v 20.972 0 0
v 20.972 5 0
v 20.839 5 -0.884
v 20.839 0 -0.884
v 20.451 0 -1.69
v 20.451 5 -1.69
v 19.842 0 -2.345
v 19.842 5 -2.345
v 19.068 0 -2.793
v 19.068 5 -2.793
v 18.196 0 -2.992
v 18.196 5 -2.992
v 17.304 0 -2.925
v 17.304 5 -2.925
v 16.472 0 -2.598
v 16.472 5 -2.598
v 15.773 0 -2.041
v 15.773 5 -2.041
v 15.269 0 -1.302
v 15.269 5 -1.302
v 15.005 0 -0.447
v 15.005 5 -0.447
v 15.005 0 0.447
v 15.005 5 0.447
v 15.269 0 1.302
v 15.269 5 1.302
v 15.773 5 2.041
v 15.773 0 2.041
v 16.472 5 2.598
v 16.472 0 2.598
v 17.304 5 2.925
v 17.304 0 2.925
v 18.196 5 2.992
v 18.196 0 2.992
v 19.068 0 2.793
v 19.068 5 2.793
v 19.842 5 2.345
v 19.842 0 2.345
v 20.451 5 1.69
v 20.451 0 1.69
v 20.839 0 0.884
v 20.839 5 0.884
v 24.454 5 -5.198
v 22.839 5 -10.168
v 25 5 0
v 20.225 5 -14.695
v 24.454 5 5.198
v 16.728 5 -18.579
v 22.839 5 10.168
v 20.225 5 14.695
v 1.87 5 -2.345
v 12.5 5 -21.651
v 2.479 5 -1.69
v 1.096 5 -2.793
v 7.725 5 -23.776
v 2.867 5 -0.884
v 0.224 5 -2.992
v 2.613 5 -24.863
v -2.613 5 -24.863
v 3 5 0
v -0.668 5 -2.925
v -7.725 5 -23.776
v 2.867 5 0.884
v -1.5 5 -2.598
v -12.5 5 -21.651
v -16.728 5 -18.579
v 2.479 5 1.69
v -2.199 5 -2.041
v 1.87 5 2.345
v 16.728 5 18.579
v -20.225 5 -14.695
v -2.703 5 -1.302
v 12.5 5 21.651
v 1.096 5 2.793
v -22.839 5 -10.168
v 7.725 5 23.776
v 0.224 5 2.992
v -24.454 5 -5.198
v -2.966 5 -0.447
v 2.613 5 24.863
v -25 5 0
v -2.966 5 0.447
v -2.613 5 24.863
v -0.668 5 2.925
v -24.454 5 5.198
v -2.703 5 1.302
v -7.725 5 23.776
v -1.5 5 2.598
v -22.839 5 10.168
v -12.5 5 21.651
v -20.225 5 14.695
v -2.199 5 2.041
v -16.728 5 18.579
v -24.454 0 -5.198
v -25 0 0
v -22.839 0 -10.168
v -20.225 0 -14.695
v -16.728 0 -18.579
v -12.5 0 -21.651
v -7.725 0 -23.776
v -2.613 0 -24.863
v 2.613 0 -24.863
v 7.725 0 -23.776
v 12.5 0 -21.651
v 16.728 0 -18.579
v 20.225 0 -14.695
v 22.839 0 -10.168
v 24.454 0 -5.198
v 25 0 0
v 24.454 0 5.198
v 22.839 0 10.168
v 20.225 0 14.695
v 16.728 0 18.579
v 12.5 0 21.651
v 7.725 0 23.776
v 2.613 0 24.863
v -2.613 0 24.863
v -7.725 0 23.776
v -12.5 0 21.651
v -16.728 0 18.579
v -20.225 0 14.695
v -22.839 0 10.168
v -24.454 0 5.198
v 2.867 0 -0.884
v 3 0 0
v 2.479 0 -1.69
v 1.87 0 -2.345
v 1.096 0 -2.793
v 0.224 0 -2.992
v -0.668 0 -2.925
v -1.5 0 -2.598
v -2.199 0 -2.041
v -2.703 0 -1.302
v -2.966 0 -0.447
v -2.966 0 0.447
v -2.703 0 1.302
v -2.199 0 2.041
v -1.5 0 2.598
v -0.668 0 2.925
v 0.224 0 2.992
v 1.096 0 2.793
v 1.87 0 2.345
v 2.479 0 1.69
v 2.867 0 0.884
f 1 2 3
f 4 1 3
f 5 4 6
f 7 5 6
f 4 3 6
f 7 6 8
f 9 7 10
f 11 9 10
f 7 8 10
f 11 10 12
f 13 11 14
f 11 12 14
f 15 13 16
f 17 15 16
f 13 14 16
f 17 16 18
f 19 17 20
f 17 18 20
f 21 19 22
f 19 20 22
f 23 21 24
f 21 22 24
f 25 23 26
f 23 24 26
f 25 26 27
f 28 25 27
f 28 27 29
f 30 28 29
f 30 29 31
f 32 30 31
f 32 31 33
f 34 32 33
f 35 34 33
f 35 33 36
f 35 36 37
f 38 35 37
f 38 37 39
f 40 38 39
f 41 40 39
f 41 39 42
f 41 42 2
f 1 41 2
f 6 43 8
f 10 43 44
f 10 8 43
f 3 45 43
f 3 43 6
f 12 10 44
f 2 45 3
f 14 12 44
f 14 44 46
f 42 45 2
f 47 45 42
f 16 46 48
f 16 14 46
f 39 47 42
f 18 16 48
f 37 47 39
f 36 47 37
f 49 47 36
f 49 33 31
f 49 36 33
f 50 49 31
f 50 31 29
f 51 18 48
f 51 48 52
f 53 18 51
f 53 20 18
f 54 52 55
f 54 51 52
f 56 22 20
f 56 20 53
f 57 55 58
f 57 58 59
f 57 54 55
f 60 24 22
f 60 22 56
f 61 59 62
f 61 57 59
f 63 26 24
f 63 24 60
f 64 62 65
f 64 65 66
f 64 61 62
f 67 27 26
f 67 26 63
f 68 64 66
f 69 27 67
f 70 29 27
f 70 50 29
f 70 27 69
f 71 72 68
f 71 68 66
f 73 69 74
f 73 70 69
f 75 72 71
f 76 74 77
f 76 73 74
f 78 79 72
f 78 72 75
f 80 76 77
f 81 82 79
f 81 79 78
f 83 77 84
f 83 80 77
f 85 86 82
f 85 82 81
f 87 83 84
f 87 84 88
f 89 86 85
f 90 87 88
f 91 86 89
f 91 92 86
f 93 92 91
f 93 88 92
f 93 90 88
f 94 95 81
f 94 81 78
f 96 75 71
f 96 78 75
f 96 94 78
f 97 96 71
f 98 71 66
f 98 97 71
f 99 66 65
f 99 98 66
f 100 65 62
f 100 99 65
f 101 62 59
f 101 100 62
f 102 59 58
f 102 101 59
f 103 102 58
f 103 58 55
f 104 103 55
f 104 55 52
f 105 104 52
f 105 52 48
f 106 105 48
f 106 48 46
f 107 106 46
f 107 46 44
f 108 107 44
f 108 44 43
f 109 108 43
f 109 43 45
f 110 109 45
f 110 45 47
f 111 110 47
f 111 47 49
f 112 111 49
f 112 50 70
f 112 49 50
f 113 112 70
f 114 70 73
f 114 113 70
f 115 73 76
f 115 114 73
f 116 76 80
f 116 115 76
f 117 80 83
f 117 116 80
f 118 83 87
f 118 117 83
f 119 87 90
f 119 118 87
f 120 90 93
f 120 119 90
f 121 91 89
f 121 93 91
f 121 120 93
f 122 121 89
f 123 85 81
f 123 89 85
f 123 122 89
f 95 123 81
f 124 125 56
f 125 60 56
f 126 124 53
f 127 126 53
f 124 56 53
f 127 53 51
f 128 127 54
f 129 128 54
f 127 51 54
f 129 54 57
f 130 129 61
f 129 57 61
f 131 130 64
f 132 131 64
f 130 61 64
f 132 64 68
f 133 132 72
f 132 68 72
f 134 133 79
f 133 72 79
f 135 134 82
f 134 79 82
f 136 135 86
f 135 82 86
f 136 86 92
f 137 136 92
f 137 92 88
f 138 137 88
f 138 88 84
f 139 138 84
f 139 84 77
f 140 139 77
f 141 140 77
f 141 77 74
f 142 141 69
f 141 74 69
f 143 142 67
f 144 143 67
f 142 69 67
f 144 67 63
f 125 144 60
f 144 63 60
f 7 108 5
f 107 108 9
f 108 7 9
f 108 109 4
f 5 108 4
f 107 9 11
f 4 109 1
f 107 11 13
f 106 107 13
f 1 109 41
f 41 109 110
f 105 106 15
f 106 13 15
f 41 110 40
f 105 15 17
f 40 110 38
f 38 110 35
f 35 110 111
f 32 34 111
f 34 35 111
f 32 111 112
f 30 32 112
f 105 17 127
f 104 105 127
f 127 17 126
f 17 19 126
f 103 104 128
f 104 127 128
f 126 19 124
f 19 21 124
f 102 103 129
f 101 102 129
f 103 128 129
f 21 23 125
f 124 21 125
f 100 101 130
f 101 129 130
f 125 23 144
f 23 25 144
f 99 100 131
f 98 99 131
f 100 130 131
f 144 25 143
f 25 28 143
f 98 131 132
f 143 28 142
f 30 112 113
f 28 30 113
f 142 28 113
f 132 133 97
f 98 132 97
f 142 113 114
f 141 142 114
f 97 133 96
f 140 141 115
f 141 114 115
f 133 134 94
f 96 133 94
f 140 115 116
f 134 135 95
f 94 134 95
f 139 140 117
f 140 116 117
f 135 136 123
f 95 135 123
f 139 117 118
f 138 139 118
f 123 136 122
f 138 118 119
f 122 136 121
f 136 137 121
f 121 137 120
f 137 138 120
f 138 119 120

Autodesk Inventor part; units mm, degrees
ref_plane "YZ Plane" through (0, 0, 0) normal (1, 0, 0) x (0, 1, 0)
ref_plane "XZ Plane" through (0, 0, 0) normal (0, 1, 0) x (-1, 0, 0)
ref_plane "XY Plane" through (0, 0, 0) normal (0, 0, 1) x (1, 0, 0)
sketch "Sketch1" plane through (0, 0, 0) normal (0, 1, 0) x (-1, 0, 0)
  circle A0 centre (0, 0) radius 25
  dimension "d0" = 50
sketch "Sketch2" plane through (0, 0, 0) normal (0, 0, 1) x (1, 0, 0)
  point P0 (0, 0)
extrude "Extrusion1" add sketch "Sketch1" along normal blind 5
sketch "Sketch3" plane through (0, 5, 0) normal (0, 1, 0) x (1, 0, 0)
  circle A0 centre (0, 0) radius 3
  dimension "d3" = 6
extrude "Extrusion2" cut sketch "Sketch3" against normal blind 5
sketch "Sketch4" plane through (0, 5, 0) normal (0, 1, 0) x (1, 0, 0)
  circle A0 centre (17.9718, 0) radius 3
  point P0 (0, 0)
  dimension "d6" = 6
extrude "Extrusion3" cut sketch "Sketch4" against normal blind 5
